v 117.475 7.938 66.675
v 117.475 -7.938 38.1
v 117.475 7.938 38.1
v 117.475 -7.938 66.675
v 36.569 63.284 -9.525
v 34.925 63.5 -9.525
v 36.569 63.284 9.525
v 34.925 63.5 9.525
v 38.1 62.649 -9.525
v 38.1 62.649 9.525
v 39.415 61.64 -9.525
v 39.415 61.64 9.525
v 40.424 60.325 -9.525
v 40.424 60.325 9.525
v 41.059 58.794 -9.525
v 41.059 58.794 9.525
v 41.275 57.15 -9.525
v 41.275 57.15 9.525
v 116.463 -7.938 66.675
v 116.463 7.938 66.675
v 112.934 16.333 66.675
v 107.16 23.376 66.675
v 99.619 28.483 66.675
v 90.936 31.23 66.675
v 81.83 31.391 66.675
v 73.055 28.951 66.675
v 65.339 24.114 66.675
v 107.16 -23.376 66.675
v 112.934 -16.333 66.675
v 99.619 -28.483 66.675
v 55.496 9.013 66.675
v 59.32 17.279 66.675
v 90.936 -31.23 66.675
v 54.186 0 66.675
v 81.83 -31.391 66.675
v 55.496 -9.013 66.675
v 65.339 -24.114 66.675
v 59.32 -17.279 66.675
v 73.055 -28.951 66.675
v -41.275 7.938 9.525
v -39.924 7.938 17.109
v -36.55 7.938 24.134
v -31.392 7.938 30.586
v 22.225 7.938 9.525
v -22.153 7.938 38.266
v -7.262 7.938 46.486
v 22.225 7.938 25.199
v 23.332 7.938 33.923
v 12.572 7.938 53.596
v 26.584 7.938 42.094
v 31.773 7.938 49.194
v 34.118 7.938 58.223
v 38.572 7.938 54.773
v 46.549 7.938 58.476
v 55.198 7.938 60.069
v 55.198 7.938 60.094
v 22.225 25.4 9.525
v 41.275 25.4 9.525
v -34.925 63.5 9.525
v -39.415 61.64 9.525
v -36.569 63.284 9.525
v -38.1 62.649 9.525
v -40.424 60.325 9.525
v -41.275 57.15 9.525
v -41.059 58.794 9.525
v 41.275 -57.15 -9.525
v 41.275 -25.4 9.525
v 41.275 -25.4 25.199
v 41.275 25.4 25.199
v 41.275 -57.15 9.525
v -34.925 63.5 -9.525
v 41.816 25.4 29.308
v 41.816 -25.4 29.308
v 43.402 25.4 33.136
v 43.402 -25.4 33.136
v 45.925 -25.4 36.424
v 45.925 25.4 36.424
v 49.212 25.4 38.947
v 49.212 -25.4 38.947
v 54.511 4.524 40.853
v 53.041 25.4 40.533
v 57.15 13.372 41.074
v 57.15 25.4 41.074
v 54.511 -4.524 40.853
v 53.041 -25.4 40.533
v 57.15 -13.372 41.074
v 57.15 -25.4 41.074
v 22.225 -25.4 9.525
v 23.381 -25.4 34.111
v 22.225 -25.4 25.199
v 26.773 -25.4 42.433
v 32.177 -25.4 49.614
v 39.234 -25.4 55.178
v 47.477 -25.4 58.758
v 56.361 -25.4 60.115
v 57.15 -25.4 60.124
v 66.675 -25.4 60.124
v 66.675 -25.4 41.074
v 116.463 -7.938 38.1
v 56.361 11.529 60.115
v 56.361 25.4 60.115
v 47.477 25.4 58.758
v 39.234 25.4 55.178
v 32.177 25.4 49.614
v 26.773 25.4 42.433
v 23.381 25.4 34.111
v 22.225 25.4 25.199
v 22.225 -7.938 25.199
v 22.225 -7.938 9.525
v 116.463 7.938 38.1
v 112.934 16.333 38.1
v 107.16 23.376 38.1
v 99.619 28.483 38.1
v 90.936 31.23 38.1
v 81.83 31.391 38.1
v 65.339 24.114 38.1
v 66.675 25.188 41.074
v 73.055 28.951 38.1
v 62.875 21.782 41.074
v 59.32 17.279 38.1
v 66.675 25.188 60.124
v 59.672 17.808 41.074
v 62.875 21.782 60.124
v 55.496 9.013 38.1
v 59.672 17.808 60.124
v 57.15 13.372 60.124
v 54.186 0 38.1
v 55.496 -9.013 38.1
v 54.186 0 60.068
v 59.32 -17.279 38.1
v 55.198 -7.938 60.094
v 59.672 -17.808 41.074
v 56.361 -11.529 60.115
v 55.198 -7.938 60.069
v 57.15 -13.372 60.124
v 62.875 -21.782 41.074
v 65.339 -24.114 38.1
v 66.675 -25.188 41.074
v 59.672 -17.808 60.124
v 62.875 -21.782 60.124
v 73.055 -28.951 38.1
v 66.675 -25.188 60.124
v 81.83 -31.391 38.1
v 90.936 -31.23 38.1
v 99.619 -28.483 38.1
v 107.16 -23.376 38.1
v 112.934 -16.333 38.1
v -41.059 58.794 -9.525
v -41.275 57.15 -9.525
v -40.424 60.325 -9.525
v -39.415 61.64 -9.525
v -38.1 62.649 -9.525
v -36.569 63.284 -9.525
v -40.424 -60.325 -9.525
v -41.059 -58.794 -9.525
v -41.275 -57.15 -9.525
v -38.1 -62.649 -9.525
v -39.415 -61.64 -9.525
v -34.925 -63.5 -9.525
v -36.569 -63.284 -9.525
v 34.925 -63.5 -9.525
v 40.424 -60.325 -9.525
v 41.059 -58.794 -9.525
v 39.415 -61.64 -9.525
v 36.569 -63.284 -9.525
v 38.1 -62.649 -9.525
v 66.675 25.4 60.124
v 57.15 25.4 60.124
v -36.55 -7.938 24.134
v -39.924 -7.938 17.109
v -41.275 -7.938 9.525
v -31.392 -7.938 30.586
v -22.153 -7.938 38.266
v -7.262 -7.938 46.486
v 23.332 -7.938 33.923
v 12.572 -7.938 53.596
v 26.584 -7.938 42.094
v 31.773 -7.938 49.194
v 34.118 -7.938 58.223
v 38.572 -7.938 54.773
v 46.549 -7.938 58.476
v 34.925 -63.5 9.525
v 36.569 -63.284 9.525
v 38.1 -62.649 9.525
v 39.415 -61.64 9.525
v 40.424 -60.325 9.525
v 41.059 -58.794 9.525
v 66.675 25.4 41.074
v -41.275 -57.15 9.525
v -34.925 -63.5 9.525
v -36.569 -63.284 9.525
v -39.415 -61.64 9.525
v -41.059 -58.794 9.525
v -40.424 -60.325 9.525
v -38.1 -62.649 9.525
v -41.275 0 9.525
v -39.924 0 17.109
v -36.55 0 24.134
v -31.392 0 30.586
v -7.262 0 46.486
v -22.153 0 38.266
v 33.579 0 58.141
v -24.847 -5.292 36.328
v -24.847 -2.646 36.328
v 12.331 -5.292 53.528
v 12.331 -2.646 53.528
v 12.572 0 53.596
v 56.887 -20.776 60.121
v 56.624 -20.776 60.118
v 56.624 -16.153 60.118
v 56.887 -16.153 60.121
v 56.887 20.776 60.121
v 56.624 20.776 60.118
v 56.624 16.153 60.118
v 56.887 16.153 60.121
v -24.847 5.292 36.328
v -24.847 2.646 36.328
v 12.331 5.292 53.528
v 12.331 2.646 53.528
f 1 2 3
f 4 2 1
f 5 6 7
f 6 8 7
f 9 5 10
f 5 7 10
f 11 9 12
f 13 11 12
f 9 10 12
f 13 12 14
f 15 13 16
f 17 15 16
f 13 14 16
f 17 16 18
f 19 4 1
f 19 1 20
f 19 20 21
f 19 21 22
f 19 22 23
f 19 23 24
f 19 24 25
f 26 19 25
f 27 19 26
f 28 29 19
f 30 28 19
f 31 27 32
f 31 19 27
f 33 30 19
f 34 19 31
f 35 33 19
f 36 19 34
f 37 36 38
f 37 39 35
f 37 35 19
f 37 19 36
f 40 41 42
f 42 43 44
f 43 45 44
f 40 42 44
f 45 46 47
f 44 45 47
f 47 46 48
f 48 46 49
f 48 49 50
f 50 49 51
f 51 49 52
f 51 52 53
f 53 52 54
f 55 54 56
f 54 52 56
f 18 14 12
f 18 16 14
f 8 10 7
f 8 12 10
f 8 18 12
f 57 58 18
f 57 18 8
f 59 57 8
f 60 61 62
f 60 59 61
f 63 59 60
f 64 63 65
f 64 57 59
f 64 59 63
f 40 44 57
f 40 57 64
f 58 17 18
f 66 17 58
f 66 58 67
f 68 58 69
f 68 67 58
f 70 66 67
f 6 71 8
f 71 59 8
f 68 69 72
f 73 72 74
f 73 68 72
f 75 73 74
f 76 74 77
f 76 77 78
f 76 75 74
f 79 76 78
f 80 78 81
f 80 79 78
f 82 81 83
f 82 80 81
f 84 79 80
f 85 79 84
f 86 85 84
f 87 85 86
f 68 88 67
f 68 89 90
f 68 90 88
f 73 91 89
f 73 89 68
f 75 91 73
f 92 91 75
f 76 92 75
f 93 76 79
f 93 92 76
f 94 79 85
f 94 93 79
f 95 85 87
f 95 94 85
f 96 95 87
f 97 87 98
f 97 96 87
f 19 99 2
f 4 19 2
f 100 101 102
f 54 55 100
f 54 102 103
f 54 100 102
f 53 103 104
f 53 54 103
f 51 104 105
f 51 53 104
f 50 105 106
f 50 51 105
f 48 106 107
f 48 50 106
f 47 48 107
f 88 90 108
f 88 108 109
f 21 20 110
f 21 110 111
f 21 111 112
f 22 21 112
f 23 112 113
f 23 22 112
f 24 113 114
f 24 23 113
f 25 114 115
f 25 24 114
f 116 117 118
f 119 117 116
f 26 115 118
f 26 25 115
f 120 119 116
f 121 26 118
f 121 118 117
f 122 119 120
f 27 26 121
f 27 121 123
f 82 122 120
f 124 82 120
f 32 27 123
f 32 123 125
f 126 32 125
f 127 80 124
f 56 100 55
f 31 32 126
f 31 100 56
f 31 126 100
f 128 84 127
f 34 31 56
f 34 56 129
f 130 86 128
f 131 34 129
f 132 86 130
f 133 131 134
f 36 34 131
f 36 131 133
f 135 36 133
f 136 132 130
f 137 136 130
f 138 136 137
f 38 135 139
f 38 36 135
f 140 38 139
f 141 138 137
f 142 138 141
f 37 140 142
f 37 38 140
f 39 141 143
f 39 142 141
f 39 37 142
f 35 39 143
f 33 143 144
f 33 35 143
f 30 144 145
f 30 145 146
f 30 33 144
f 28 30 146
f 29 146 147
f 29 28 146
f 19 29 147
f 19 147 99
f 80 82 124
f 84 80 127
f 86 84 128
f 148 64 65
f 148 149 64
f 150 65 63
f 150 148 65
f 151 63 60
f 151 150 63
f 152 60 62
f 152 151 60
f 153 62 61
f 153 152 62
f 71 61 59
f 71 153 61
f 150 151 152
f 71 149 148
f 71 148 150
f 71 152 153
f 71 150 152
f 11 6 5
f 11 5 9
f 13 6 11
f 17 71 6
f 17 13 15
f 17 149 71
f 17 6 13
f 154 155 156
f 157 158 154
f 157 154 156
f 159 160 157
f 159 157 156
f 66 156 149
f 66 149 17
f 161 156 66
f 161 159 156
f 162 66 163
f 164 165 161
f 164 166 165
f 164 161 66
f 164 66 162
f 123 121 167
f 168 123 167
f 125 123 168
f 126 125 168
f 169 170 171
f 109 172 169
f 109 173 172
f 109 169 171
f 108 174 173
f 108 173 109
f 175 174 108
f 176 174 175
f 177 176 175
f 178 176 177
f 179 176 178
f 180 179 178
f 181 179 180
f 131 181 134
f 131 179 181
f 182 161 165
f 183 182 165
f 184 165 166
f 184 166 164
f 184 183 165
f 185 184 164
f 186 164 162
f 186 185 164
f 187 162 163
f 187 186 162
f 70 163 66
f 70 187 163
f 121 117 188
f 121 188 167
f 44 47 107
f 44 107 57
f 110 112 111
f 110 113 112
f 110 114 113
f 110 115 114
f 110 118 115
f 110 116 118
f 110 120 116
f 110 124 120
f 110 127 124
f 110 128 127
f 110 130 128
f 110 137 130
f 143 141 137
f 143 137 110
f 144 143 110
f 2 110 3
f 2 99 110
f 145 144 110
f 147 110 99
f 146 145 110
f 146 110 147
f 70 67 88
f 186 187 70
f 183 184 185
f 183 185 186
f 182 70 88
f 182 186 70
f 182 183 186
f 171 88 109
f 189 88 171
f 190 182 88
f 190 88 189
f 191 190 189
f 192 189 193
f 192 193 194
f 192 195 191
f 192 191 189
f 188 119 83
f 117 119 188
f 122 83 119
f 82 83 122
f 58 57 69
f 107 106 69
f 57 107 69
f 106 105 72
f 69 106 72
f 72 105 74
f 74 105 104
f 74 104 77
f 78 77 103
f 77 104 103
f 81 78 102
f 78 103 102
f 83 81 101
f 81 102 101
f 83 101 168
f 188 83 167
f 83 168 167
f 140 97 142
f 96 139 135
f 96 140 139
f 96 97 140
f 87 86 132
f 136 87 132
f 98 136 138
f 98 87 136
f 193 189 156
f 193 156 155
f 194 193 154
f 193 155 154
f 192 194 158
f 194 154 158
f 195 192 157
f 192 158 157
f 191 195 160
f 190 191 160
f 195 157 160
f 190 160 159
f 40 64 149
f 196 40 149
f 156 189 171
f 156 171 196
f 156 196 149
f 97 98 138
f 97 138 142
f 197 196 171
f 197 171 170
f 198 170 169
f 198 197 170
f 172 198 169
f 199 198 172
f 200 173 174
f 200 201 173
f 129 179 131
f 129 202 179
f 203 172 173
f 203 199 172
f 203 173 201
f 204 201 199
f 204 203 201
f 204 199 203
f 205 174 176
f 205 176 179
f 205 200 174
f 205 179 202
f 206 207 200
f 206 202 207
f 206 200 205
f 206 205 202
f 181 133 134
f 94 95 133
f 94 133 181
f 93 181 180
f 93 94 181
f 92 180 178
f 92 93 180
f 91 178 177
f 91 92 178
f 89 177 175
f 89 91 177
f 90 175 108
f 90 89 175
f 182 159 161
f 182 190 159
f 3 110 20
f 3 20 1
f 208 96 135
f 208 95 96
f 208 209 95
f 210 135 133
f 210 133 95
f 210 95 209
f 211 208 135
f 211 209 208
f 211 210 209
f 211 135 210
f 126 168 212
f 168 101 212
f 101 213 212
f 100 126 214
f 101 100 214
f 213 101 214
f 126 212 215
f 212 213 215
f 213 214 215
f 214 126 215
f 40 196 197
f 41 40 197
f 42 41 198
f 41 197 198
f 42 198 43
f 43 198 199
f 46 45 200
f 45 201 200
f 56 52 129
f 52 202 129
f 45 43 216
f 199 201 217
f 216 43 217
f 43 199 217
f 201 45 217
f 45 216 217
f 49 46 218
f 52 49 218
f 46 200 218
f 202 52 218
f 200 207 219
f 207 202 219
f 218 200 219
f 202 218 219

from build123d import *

# Parameters (mm, degrees)
F1_DEPTH = 63.5
F2_DEPTH = 25.4
F0_W     = 31.6445648432
F0_H     = 28.575
F3_DEPTH = 7.9375
F5_R     = 6.35


with BuildPart() as f1:
    # F0 (on Front) → F1 (new body, symmetric)
    with BuildSketch(Plane.XZ):
        Polygon((-41.275, -9.525), (41.275, -9.525), (41.275, 9.525), (22.225, 9.525), (-41.275, 9.525), align=None)
    extrude(amount=F1_DEPTH, both=True)

    # F0 (on Front) → F2 (join, symmetric)
    with BuildSketch(Plane.XZ):
        with BuildLine():
            Line((22.225, 9.525), (41.275, 9.525))
            Line((41.275, 9.525), (41.275, 25.1988060772))
            ThreePointArc((41.275, 25.1988060772), (45.9246798487, 36.4241262286), (57.15, 41.0738060772))
            Line((57.15, 41.0738060772), (66.675, 41.0738060772))
            Line((66.675, 41.0738060772), (66.675, 60.1238060772))
            Line((66.675, 60.1238060772), (57.15, 60.1238060772))
            add(Edge.make_bspline(
                [(56.3607333992, 60.1148866596), (56.6244550053, 60.118607245), (56.8875501507, 60.1215808142), (57.15, 60.1238060772)],
                knots=[109.9586728318, 109.9586728318, 109.9586728318, 109.9586728318, 110.6694167394, 110.6694167394, 110.6694167394, 110.6694167394], degree=3))
            ThreePointArc((56.3607333992, 60.1148866596), (32.1768067617, 49.6138679138), (22.225, 25.1988060772))
            Line((22.225, 25.1988060772), (22.225, 9.525))
        make_face()
    extrude(amount=F2_DEPTH, both=True)

    # F0 (on Front) → F3 (join, symmetric)
    with BuildSketch(Plane.XZ):
        Polygon((-41.275, -9.525), (41.275, -9.525), (41.275, 9.525), (22.225, 9.525), (-41.275, 9.525), align=None)
        with BuildLine():
            Line((22.225, 9.525), (41.275, 9.525))
            Line((41.275, 9.525), (41.275, 25.1988060772))
            ThreePointArc((41.275, 25.1988060772), (45.9246798487, 36.4241262286), (57.15, 41.0738060772))
            Line((57.15, 41.0738060772), (66.675, 41.0738060772))
            Line((66.675, 41.0738060772), (66.675, 60.1238060772))
            Line((66.675, 60.1238060772), (57.15, 60.1238060772))
            add(Edge.make_bspline(
                [(56.3607333992, 60.1148866596), (56.6244550053, 60.118607245), (56.8875501507, 60.1215808142), (57.15, 60.1238060772)],
                knots=[109.9586728318, 109.9586728318, 109.9586728318, 109.9586728318, 110.6694167394, 110.6694167394, 110.6694167394, 110.6694167394], degree=3))
            ThreePointArc((56.3607333992, 60.1148866596), (32.1768067617, 49.6138679138), (22.225, 25.1988060772))
            Line((22.225, 25.1988060772), (22.225, 9.525))
        make_face()
        with BuildLine():
            add(Edge.make_bspline(
                [(-41.275, 9.525), (-40.2339300381, 41.0838661131), (15.5605556063, 59.539277601), (56.3607333992, 60.1148866596)],
                knots=[0, 0, 0, 0, 109.9586728318, 109.9586728318, 109.9586728318, 109.9586728318], degree=3))
            Line((-41.275, 9.525), (22.225, 9.525))
            Line((22.225, 9.525), (22.225, 25.1988060772))
            ThreePointArc((22.225, 25.1988060772), (32.1768067617, 49.6138679138), (56.3607333992, 60.1148866596))
        make_face()
        with BuildLine():
            ThreePointArc((57.15, 60.1238060772), (56.7553415011, 60.1215761516), (56.3607333992, 60.1148866596))
            add(Edge.make_bspline(
                [(56.3607333992, 60.1148866596), (56.6244550053, 60.118607245), (56.8875501507, 60.1215808142), (57.15, 60.1238060772)],
                knots=[109.9586728318, 109.9586728318, 109.9586728318, 109.9586728318, 110.6694167394, 110.6694167394, 110.6694167394, 110.6694167394], degree=3))
        make_face()
        Polygon((66.675, 60.1238060772), (66.675, 41.0738060772), (66.675, 38.1), (85.8304351568, 38.1), (85.8304351568, 66.675), (66.675, 66.675), align=None)
        with Locations((101.6527175784, 52.3875)):
            Rectangle(F0_W, F0_H)
    extrude(amount=F3_DEPTH, both=True)

    # F0 (on Front) → F4 (revolve)
    with BuildSketch(Plane.XZ):
        with Locations((101.6527175784, 52.3875)):
            Rectangle(F0_W, F0_H)
    revolve(axis=Axis((85.8304351568, 0, 52.3875), (0, 0, 1)))

    # F5
    f5_edges = [f1.edges().sort_by_distance(p)[0] for p in [
        (-41.275, -63.5, 0),
        (41.275, -63.5, 0),
        (41.275, 63.5, 0),
        (-41.275, 63.5, 0),
    ]]
    fillet(f5_edges, radius=F5_R)


solid = f1.part
